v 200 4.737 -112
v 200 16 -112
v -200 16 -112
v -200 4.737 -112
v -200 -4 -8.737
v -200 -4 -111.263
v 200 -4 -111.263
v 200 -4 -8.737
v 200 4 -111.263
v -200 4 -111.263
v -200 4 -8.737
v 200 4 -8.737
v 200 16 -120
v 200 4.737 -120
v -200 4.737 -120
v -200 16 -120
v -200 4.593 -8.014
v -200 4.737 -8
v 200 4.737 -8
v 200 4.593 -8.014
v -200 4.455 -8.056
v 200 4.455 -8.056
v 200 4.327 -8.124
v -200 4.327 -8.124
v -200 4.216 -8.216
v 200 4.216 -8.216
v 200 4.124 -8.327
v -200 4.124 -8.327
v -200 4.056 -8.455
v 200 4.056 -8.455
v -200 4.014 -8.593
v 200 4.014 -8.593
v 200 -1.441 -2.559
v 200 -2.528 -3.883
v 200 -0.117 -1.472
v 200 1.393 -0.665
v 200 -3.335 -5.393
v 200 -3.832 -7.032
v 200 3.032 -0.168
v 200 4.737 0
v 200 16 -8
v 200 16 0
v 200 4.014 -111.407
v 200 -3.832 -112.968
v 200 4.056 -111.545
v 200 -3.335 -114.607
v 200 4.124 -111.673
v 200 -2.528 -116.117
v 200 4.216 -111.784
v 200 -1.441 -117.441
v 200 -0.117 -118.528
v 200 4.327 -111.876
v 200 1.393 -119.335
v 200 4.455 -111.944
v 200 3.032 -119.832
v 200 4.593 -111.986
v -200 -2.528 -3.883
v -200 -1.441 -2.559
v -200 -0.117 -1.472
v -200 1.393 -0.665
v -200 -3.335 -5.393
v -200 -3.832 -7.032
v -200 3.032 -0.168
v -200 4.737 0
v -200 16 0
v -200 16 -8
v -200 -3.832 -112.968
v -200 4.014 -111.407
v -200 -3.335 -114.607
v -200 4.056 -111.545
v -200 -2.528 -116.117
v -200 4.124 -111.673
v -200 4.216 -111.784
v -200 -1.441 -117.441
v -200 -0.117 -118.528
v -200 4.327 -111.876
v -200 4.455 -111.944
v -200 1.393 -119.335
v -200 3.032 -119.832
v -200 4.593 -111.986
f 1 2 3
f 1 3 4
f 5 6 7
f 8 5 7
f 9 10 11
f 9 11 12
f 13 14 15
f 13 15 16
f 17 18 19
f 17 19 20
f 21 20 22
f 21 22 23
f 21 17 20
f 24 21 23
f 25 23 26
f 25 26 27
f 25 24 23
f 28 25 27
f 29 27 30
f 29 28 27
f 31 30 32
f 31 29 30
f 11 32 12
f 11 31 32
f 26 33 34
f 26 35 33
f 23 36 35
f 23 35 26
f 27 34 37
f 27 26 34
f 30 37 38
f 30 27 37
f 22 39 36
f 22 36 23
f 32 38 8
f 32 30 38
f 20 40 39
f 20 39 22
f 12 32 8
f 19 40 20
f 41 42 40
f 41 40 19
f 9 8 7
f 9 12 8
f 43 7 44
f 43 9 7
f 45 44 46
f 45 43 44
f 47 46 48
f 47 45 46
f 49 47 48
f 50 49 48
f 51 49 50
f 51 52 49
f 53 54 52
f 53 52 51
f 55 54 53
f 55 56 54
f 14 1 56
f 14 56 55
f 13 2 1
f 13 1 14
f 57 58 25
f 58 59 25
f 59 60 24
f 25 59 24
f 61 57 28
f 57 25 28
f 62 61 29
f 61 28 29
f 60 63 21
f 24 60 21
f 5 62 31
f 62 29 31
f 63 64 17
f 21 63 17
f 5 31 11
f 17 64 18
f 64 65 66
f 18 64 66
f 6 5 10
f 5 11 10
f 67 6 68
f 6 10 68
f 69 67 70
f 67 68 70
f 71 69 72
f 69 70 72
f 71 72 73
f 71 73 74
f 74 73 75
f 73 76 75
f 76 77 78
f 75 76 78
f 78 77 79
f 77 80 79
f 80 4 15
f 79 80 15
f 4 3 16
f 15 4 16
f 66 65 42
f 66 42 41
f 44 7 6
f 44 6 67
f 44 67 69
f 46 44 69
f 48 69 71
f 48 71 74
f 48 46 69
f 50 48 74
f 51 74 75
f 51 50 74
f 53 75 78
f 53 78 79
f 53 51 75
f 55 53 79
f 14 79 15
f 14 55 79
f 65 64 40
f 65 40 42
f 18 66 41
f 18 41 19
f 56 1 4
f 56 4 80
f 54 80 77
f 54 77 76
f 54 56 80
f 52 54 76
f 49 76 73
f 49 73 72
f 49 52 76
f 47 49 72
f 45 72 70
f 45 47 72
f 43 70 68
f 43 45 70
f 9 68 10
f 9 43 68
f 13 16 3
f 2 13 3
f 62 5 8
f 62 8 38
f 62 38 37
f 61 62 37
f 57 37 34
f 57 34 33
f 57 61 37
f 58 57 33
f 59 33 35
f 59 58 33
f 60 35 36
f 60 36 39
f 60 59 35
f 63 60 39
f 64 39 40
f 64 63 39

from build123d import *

# Parameters (mm, degrees)
SM_START                         = -4
SM_BASE_FLANGE_1_OUTLINE_W       = 400
SM_BASE_FLANGE_1_OUTLINE_H       = 120
SM_BASE_FLANGE_1_DEPTH           = 8
SM_EDGE_FLANGE_1_STRIP_W         = 33.4732
SM_EDGE_FLANGE_1_STRIP_H         = 8
SM_EDGE_FLANGE_1_STRIP_CUT_DEPTH = 400
SM_EDGE_FLANGE_1_DEPTH           = 400
SM_EDGE_FLANGE_2_STRIP_W         = 33.4732
SM_EDGE_FLANGE_2_STRIP_H         = 8
SM_EDGE_FLANGE_2_STRIP_CUT_DEPTH = 400
SM_EDGE_FLANGE_2_DEPTH           = 400


# Read off the part's stored shape, not the designer's step: 基体-法兰1
# Sheet-metal steps are written as plain solids
with BuildPart() as part:
    # 基体-法兰1 outline → 基体-法兰1 (new body)
    with BuildSketch(Plane(origin=(0, 0, 0), x_dir=(1, 0, 0), z_dir=(0, 1, 0)).offset(SM_START)):
        with Locations((0, 60)):
            Rectangle(SM_BASE_FLANGE_1_OUTLINE_W, SM_BASE_FLANGE_1_OUTLINE_H)
    extrude(amount=SM_BASE_FLANGE_1_DEPTH)

    # 边线-法兰1 strip (across the edge) → 边线-法兰1 strip cut (cut)
    with BuildSketch(Plane(origin=(-200, 4, 0), x_dir=(0, 0, -1), z_dir=(1, 0, 0))):
        with Locations((-8, -4)):
            Rectangle(SM_EDGE_FLANGE_1_STRIP_W, SM_EDGE_FLANGE_1_STRIP_H)
    extrude(amount=SM_EDGE_FLANGE_1_STRIP_CUT_DEPTH, mode=Mode.SUBTRACT)

    # 边线-法兰1 section (across the edge) → 边线-法兰1 (add)
    with BuildSketch(Plane(origin=(-200, 4, 0), x_dir=(0, 0, -1), z_dir=(1, 0, 0))):
        with BuildLine():
            Line((0, 0.7366), (0, 12))
            Line((0, 12), (8, 12))
            Line((8, 12), (8, 0.7366))
            ThreePointArc((8, 0.7366), (8.215745145, 0.215745145), (8.7366, 0))
            Line((8.7366, 0), (8.7366, -8))
            ThreePointArc((8.7366, -8), (2.558890895, -5.441109105), (0, 0.7366))
        make_face()
    extrude(amount=SM_EDGE_FLANGE_1_DEPTH)

    # 边线-法兰2 strip (across the edge) → 边线-法兰2 strip cut (cut)
    with BuildSketch(Plane(origin=(200, 4, -120), x_dir=(0, 0, 1), z_dir=(-1, 0, 0))):
        with Locations((-8, -4)):
            Rectangle(SM_EDGE_FLANGE_2_STRIP_W, SM_EDGE_FLANGE_2_STRIP_H)
    extrude(amount=SM_EDGE_FLANGE_2_STRIP_CUT_DEPTH, mode=Mode.SUBTRACT)

    # 边线-法兰2 section (across the edge) → 边线-法兰2 (add)
    with BuildSketch(Plane(origin=(200, 4, -120), x_dir=(0, 0, 1), z_dir=(-1, 0, 0))):
        with BuildLine():
            Line((0, 0.7366), (0, 12))
            Line((0, 12), (8, 12))
            Line((8, 12), (8, 0.7366))
            ThreePointArc((8, 0.7366), (8.215745145, 0.215745145), (8.7366, 0))
            Line((8.7366, 0), (8.7366, -8))
            ThreePointArc((8.7366, -8), (2.558890895, -5.441109105), (0, 0.7366))
        make_face()
    extrude(amount=SM_EDGE_FLANGE_2_DEPTH)


solid = part.part
